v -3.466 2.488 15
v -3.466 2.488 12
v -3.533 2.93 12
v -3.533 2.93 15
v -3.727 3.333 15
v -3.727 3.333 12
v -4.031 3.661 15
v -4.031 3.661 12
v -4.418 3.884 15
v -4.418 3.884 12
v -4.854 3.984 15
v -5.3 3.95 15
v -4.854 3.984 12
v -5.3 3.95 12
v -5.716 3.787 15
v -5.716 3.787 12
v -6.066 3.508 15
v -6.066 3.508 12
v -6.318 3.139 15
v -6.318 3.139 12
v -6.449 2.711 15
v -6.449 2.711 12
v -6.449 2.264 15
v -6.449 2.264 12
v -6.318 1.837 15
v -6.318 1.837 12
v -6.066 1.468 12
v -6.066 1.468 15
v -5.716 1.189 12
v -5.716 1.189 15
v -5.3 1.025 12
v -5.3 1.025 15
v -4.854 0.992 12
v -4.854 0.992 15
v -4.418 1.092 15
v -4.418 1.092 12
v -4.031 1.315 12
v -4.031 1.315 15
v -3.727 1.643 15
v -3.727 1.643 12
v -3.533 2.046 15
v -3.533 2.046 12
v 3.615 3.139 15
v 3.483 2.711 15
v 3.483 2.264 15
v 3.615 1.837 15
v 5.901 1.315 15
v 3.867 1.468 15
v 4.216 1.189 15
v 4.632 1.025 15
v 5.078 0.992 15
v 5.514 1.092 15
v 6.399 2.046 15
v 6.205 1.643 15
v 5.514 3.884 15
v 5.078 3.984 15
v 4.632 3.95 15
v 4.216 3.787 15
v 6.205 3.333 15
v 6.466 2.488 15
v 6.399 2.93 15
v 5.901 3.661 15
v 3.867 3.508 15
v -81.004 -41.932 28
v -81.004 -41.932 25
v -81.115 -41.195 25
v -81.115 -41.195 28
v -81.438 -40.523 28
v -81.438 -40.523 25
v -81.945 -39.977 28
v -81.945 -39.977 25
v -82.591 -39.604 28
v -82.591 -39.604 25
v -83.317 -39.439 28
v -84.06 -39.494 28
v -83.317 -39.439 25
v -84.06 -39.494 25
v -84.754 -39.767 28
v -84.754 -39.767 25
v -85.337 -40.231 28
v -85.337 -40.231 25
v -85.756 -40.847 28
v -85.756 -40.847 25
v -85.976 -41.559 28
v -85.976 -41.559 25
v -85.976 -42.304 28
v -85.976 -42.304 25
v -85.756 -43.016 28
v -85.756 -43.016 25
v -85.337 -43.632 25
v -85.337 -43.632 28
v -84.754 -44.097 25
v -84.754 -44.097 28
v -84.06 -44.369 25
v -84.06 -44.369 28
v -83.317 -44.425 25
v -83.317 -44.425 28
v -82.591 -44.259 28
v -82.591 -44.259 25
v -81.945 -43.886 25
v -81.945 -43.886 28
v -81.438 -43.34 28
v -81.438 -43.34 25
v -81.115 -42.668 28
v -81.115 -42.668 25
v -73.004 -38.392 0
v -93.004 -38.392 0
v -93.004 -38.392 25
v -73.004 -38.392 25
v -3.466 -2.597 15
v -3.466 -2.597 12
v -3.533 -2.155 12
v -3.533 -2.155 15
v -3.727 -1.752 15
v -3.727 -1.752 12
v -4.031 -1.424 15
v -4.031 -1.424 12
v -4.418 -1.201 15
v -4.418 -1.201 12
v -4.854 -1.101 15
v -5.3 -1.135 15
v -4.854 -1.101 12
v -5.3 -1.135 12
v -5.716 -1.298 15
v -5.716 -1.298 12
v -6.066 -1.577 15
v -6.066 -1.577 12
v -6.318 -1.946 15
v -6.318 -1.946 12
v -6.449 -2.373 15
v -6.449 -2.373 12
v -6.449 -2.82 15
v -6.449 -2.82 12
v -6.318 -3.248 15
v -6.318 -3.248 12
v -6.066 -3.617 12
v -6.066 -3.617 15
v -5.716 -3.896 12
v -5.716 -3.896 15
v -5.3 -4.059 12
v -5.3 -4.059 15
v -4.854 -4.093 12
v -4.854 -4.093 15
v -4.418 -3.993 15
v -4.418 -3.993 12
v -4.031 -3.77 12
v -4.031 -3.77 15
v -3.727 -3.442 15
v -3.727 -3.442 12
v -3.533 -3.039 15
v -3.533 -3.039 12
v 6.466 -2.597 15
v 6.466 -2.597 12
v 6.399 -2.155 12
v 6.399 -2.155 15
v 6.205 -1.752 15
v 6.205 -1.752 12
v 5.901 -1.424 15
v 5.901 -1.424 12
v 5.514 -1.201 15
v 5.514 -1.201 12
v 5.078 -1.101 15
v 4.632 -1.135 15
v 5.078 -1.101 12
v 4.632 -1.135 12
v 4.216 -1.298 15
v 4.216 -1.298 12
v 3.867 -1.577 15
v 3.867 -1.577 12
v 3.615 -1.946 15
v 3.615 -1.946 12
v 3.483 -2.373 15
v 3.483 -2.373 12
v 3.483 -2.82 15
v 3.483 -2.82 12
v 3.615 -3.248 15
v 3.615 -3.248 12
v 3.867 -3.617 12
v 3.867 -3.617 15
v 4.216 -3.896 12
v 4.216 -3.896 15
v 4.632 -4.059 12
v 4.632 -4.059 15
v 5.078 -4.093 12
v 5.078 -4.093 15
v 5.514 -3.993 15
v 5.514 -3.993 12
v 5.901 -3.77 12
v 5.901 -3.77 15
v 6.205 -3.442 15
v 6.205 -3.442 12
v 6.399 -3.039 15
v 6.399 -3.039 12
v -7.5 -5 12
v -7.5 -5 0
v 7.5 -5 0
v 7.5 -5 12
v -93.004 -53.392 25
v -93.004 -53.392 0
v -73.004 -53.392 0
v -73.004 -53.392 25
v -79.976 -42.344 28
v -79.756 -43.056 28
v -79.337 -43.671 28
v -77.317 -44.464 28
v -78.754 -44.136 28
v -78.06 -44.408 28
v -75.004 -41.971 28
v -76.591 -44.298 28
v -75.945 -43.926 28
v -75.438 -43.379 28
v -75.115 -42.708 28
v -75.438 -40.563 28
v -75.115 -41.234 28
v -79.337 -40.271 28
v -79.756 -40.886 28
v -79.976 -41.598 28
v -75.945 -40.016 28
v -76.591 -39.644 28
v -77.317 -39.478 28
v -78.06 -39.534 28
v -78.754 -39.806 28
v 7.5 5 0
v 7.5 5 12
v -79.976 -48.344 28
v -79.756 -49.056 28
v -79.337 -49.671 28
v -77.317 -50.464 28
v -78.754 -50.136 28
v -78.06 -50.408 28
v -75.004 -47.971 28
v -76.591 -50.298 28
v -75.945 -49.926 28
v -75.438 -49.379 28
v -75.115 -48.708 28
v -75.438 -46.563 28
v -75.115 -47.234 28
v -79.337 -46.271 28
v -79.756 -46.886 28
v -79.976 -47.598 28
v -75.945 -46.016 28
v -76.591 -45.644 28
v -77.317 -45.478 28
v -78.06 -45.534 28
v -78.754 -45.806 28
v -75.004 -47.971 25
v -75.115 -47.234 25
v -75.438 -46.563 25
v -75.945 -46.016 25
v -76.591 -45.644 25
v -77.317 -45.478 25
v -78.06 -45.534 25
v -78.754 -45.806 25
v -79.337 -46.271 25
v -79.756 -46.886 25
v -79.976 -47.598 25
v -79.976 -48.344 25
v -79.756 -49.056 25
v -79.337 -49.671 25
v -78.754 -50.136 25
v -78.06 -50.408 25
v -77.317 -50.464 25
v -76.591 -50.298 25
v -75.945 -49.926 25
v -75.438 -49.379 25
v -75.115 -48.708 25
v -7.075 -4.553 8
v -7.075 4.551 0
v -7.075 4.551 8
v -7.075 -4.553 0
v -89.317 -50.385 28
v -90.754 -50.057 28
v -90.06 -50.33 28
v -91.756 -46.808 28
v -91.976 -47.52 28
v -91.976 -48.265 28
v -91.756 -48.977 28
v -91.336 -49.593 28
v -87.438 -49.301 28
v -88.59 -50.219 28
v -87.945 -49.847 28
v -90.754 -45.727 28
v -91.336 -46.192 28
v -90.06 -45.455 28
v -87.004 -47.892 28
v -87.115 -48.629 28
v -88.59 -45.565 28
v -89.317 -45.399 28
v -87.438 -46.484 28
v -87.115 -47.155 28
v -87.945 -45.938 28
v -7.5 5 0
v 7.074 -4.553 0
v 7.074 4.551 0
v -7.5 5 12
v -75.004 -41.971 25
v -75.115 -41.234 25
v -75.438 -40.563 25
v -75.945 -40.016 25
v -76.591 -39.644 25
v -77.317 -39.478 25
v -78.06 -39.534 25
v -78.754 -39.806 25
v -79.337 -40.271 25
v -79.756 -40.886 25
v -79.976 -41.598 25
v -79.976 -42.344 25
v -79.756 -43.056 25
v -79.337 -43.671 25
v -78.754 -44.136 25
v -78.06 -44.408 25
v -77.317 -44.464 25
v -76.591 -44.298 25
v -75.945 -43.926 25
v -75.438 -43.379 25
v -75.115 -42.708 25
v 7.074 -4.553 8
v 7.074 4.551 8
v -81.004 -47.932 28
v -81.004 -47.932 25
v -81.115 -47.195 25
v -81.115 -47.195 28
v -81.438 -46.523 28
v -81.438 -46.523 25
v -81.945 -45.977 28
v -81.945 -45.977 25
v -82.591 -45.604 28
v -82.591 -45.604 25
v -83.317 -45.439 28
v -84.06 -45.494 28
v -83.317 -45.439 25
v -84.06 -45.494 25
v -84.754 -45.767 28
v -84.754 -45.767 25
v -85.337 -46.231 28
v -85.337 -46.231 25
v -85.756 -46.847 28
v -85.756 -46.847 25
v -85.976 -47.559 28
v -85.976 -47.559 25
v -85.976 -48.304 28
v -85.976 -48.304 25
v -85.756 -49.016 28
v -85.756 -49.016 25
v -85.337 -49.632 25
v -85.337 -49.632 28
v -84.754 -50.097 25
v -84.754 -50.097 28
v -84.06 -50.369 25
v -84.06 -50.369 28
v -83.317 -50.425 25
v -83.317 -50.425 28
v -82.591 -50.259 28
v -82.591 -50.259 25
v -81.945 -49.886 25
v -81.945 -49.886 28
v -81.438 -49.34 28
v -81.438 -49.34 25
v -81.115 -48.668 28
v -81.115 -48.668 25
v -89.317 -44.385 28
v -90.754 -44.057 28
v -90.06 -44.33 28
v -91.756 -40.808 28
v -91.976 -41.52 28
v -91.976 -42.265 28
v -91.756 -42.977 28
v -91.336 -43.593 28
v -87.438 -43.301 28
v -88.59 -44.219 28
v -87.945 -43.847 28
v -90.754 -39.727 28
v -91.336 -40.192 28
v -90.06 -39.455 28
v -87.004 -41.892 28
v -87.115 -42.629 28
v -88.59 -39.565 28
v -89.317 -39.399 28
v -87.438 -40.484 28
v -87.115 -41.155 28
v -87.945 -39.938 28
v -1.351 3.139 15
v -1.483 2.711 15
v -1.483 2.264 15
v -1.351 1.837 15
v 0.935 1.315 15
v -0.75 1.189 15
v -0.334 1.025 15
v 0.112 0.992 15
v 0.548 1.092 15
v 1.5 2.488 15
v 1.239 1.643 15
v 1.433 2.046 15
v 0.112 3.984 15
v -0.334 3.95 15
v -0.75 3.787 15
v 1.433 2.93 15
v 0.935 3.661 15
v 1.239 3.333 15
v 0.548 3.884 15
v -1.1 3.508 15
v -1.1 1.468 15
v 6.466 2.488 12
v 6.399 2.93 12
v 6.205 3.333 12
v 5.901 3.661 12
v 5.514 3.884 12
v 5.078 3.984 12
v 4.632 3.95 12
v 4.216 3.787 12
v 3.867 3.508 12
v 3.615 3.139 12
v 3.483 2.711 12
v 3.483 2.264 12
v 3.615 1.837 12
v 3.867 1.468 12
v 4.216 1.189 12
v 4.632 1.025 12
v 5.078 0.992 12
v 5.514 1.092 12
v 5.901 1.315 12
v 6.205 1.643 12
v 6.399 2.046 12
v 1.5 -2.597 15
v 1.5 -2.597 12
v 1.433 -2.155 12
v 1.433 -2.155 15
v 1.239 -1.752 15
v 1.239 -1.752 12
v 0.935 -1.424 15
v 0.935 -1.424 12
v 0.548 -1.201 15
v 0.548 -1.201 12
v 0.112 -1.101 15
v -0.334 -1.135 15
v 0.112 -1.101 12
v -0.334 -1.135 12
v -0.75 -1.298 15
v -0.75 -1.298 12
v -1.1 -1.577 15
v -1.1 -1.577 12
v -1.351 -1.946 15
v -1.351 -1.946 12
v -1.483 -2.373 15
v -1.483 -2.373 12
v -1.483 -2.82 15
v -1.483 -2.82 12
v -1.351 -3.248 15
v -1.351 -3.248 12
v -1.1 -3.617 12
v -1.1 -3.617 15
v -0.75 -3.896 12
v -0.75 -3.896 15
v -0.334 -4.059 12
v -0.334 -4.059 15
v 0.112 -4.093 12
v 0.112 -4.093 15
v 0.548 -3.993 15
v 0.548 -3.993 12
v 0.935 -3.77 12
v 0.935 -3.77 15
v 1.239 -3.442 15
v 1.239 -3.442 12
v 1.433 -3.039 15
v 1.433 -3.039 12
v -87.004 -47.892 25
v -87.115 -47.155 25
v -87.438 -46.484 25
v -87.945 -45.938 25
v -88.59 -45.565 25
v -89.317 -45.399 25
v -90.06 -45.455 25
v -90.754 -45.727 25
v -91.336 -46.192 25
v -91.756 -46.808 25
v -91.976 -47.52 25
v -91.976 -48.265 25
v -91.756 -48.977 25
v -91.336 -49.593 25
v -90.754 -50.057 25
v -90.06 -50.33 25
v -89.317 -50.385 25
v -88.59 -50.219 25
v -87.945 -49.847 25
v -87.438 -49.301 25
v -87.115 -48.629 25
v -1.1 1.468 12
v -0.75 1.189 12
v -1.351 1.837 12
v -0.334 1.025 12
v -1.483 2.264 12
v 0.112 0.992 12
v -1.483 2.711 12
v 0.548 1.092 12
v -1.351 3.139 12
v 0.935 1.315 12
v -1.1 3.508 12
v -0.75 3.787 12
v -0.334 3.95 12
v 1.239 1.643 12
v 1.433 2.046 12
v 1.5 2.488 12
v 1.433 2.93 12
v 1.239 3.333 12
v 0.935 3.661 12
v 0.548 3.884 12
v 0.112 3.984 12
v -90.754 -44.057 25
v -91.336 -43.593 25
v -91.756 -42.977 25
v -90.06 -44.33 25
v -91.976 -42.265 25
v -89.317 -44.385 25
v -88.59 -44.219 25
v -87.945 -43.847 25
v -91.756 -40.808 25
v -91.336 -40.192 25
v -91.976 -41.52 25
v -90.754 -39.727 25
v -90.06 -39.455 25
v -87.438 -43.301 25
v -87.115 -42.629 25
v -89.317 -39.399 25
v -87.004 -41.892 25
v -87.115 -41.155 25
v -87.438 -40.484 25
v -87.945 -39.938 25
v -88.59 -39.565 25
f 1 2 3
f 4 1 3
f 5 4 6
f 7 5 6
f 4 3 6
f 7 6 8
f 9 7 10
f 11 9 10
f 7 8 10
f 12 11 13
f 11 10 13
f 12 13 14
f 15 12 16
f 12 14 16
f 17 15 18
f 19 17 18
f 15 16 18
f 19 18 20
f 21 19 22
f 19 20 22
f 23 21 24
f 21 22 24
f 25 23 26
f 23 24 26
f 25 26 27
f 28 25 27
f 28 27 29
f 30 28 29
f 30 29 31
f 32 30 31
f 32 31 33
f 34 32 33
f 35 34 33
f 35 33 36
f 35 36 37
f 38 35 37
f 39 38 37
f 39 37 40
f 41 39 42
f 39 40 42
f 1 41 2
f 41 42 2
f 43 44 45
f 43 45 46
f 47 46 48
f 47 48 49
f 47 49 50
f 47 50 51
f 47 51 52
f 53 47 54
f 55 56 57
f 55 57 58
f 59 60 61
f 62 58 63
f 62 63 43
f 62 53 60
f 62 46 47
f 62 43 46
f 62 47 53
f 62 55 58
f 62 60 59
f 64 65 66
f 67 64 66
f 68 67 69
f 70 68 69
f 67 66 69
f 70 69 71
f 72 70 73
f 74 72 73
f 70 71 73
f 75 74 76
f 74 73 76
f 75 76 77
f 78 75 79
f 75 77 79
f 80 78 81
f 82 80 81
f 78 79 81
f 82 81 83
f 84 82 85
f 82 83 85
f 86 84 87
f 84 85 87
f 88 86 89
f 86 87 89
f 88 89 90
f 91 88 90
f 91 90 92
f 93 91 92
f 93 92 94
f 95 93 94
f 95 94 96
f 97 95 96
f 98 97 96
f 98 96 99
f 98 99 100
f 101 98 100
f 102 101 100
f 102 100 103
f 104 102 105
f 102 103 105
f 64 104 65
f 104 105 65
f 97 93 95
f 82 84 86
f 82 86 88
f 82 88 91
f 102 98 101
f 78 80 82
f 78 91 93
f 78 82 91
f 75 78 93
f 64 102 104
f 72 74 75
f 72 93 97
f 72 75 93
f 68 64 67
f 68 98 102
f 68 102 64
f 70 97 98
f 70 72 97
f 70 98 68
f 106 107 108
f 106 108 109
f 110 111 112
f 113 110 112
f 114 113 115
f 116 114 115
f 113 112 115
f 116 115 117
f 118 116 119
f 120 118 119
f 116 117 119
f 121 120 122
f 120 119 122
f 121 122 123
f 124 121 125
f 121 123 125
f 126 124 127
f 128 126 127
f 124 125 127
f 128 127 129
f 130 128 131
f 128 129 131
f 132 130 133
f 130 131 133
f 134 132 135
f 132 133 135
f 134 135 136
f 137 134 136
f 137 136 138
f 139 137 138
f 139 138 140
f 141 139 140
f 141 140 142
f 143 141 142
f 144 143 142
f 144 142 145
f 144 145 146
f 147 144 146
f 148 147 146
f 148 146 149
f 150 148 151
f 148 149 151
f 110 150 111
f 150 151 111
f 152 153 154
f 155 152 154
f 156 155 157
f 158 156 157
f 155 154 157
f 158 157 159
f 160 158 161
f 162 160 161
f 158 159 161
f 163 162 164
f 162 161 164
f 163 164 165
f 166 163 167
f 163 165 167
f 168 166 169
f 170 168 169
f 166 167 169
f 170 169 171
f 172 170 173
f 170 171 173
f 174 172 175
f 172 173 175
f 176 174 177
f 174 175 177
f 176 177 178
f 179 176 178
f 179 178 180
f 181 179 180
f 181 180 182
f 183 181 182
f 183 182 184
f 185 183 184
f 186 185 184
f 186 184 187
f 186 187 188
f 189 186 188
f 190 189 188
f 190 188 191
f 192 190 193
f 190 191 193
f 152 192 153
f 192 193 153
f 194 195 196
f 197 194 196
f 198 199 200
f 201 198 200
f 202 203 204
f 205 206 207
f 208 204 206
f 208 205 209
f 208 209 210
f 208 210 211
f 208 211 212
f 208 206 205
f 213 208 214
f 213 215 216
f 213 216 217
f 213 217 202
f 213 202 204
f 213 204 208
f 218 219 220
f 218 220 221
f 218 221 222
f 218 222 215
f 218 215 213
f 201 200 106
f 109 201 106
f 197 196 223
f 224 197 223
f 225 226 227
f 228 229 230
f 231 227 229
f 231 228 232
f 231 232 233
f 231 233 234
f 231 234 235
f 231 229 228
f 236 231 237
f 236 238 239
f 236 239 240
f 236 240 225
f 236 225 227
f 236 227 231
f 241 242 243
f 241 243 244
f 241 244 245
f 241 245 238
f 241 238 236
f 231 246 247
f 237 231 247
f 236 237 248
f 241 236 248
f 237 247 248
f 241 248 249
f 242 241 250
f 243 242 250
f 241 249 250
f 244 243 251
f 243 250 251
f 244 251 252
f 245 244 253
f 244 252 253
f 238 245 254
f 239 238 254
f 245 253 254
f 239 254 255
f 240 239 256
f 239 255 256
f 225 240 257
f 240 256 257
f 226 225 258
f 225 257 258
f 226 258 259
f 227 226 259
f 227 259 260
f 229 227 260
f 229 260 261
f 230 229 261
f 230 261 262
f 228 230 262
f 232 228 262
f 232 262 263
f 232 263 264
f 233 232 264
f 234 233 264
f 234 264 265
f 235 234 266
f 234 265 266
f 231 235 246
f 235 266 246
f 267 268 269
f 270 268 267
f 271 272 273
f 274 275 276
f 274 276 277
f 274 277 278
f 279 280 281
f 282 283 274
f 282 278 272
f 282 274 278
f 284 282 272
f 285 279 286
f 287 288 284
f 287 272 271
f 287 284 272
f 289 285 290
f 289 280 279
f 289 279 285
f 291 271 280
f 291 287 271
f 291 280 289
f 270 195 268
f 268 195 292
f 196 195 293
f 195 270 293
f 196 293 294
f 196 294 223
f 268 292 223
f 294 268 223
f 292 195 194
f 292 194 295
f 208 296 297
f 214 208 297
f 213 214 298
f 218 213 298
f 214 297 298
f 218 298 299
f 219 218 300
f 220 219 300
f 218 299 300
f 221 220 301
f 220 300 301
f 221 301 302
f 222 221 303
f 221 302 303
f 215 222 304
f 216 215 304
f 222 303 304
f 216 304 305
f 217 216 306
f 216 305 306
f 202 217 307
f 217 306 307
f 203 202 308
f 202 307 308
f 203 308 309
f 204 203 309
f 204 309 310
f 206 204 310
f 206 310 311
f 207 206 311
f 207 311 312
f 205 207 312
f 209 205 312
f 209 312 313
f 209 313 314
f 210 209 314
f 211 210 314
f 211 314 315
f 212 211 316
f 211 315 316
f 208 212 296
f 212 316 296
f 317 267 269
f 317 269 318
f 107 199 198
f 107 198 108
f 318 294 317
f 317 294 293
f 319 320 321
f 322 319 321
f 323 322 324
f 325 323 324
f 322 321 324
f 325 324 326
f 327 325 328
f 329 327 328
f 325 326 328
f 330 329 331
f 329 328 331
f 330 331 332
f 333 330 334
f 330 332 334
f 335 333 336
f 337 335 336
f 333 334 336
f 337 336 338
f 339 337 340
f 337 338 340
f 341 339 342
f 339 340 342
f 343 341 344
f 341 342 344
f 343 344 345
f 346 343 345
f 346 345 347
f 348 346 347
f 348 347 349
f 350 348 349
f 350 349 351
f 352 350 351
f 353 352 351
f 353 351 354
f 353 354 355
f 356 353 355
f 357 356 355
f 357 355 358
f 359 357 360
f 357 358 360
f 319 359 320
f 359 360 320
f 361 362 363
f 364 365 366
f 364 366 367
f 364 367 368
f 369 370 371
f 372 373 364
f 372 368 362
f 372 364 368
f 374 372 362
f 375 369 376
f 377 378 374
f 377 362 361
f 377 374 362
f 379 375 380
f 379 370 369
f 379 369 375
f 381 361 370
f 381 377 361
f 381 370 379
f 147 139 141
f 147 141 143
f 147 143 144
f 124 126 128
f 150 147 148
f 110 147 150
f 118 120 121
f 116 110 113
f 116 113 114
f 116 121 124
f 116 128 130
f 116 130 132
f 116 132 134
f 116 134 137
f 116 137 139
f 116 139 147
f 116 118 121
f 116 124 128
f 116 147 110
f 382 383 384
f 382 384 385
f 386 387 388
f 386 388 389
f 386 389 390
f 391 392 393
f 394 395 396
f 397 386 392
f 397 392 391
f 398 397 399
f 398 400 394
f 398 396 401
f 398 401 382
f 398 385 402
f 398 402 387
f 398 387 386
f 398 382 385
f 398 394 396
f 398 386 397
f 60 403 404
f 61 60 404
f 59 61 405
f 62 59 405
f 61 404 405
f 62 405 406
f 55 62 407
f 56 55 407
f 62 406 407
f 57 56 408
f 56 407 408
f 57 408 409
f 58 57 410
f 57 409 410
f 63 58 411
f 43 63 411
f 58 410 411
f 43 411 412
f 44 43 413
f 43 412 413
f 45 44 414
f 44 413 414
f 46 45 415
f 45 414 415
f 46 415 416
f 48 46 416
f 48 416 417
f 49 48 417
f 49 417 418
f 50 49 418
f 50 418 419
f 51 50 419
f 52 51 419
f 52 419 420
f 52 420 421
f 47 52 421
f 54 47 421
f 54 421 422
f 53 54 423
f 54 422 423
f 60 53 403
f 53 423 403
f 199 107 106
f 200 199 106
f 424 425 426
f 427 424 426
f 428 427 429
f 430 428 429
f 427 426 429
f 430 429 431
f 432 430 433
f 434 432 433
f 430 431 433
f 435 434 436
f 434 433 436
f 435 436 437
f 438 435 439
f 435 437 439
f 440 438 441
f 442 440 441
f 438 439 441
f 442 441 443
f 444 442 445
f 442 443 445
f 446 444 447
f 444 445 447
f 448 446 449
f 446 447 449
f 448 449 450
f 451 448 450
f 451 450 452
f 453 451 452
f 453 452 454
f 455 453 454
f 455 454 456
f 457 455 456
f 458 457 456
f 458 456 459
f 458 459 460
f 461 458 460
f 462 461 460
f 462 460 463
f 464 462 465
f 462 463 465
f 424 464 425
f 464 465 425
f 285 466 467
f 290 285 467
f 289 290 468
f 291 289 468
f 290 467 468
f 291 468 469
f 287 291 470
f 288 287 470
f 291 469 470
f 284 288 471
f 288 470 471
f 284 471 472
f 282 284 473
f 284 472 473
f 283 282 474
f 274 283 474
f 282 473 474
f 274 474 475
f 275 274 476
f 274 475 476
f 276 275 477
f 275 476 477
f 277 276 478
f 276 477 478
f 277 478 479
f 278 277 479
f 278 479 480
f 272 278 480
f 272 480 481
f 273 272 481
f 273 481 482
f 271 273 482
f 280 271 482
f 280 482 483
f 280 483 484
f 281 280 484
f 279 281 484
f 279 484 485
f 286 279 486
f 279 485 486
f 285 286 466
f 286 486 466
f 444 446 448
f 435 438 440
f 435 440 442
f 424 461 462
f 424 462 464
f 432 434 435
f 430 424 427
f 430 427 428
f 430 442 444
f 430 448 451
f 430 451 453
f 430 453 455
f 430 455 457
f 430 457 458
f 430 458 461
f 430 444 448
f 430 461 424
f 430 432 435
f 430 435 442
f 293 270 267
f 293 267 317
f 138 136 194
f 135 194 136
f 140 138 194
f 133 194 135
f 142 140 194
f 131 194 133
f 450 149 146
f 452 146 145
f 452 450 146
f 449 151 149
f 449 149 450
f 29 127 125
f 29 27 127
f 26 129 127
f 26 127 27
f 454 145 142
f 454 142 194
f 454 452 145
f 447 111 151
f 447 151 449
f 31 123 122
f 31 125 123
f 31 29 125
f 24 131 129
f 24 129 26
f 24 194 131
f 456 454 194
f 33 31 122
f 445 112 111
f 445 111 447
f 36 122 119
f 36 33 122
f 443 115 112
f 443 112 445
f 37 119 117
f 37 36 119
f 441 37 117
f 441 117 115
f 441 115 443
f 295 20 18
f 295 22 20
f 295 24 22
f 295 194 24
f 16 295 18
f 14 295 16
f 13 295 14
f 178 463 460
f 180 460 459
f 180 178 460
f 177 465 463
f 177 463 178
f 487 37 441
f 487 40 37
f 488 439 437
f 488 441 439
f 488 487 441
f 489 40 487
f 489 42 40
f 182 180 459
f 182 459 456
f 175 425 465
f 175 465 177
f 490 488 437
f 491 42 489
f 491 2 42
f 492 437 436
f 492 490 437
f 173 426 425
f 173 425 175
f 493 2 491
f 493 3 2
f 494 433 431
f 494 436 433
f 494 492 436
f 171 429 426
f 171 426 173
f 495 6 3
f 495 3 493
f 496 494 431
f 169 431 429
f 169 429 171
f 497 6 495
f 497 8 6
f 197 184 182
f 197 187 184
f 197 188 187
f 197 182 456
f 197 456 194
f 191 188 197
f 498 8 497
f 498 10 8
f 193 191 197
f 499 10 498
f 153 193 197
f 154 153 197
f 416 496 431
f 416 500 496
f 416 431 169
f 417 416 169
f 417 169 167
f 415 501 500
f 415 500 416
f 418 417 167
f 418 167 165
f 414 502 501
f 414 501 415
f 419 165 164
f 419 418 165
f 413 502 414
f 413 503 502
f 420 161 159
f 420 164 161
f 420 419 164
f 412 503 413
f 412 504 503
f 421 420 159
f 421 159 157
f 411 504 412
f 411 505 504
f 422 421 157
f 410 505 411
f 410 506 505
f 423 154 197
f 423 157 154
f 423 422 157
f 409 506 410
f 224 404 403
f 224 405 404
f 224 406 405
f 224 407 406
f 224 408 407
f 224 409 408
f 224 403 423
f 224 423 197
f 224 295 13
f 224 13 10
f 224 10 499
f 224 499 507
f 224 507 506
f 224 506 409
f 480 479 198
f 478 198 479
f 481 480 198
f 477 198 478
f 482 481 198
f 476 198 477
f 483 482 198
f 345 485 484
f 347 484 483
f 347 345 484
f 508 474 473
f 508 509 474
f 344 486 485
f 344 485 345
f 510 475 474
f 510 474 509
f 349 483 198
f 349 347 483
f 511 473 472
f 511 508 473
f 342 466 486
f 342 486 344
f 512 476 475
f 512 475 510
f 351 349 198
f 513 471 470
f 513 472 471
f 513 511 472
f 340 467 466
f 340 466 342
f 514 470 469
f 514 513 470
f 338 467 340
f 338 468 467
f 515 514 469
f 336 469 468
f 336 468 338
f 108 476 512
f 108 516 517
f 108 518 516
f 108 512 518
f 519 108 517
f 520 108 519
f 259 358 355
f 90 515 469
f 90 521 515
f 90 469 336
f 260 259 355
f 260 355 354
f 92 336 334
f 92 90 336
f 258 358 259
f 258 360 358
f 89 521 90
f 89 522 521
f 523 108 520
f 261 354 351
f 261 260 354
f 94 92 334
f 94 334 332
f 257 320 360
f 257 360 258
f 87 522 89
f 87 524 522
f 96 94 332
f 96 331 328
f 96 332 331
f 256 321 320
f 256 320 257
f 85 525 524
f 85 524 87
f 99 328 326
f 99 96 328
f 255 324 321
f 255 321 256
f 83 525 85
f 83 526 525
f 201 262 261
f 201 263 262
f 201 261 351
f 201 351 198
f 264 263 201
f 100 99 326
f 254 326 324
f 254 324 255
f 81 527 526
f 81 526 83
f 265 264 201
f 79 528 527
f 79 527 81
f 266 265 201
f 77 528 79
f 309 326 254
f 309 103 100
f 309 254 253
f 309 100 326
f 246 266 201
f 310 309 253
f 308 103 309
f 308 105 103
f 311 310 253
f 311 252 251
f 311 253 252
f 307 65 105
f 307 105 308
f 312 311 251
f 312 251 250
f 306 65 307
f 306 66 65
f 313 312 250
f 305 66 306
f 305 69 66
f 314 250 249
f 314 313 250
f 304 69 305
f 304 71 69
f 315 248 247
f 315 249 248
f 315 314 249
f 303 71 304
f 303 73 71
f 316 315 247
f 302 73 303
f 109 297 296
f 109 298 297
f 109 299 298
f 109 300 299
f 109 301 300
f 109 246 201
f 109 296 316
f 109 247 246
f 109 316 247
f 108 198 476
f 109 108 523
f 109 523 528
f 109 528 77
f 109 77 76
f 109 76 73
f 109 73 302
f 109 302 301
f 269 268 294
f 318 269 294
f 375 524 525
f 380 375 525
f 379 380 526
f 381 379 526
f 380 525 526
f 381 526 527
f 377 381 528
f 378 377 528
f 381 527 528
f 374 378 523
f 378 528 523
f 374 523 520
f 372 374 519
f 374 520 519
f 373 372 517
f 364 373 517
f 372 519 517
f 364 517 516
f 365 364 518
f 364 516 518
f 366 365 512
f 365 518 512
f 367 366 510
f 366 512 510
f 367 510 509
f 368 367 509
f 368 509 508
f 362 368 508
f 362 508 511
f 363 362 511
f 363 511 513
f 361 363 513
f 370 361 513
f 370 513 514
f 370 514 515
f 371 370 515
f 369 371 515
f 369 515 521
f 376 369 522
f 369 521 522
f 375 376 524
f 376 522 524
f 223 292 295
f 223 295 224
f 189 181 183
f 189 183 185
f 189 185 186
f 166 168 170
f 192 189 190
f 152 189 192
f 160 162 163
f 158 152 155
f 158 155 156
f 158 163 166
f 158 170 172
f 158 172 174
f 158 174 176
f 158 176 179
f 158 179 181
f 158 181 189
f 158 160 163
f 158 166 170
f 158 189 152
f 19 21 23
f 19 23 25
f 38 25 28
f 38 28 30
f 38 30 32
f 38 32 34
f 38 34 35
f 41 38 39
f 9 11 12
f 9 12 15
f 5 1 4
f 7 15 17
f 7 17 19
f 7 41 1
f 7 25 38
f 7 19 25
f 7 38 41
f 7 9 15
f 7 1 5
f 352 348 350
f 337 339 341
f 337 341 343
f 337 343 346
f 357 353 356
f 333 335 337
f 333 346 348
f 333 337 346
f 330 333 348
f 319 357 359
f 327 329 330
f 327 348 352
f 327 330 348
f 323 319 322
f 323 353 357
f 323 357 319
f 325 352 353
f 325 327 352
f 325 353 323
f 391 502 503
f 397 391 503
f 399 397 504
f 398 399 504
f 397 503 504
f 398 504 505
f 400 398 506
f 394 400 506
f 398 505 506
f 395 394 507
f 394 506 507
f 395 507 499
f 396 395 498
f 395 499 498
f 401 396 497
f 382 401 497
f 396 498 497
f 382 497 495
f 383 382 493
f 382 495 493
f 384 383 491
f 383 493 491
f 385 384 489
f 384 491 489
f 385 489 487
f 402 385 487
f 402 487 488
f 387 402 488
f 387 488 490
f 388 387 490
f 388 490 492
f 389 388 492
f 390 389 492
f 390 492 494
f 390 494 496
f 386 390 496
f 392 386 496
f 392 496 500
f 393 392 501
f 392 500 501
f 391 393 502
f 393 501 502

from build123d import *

# Parameters (mm, degrees)
F0_W     = 15
F0_H     = 10
F1_DEPTH = 12
F2_R     = 1.5
F3_DEPTH = 3
F4_W     = 20
F4_H     = 15
F5_DEPTH = 25
F6_R     = 2.5
F7_DEPTH = 3
F8_W     = 14.1492537223
F8_H     = 9.1035095975
F9_DEPTH = 8


# Not quite as in the source:
# - the program builds the solid bodies; features that only make, move or delete a surface that nothing else refers to are left out


with BuildPart() as f1:
    # F0 (on Top) → F1 (new body)
    with BuildSketch(Plane.XY):
        Rectangle(F0_W, F0_H)
    extrude(amount=F1_DEPTH)

    # F2 (on face) → F3 (join)
    with BuildSketch(Plane.XY.offset(12)):
        with Locations((-4.9661255717, -2.5968982129)):
            Circle(F2_R)
        with Locations((-4.9661255717, 2.4878393313)):
            Circle(F2_R)
        with Locations((0, 2.4878393313)):
            Circle(F2_R)
        with Locations((0, -2.5968982129)):
            Circle(F2_R)
        with Locations((4.9661255717, -2.5968982129)):
            Circle(F2_R)
        with Locations((4.9661255717, 2.4878393313)):
            Circle(F2_R)
    extrude(amount=F3_DEPTH)

    # F8 (on face) → F9 (cut)
    with BuildSketch(Plane(origin=(0, 0, 0), x_dir=(1, 0, 0), z_dir=(0, 0, -1))):
        with Locations((-0.0008016359, 0.0008624047)):
            Rectangle(F8_W, F8_H)
    extrude(amount=-F9_DEPTH, mode=Mode.SUBTRACT)


with BuildPart() as f5:
    # F4 (on Top) → F5 (new body)
    with BuildSketch(Plane.XY):
        with Locations((-83.0038021637, -45.8922367543)):
            Rectangle(F4_W, F4_H)
    extrude(amount=F5_DEPTH)

    # F6 (on face) → F7 (join)
    with BuildSketch(Plane.XY.offset(25)):
        with Locations((-89.5038021637, -47.8922367543)):
            Circle(F6_R)
        with Locations((-89.5038021637, -41.8922367543)):
            Circle(F6_R)
        with Locations((-83.5039313242, -47.9316056411)):
            Circle(F6_R)
        with Locations((-83.5039313242, -41.9316056411)):
            Circle(F6_R)
        with Locations((-77.5040604847, -47.9709745279)):
            Circle(F6_R)
        with Locations((-77.5040604847, -41.9709745279)):
            Circle(F6_R)
    extrude(amount=F7_DEPTH)


solid = Compound([f1.part, f5.part])
